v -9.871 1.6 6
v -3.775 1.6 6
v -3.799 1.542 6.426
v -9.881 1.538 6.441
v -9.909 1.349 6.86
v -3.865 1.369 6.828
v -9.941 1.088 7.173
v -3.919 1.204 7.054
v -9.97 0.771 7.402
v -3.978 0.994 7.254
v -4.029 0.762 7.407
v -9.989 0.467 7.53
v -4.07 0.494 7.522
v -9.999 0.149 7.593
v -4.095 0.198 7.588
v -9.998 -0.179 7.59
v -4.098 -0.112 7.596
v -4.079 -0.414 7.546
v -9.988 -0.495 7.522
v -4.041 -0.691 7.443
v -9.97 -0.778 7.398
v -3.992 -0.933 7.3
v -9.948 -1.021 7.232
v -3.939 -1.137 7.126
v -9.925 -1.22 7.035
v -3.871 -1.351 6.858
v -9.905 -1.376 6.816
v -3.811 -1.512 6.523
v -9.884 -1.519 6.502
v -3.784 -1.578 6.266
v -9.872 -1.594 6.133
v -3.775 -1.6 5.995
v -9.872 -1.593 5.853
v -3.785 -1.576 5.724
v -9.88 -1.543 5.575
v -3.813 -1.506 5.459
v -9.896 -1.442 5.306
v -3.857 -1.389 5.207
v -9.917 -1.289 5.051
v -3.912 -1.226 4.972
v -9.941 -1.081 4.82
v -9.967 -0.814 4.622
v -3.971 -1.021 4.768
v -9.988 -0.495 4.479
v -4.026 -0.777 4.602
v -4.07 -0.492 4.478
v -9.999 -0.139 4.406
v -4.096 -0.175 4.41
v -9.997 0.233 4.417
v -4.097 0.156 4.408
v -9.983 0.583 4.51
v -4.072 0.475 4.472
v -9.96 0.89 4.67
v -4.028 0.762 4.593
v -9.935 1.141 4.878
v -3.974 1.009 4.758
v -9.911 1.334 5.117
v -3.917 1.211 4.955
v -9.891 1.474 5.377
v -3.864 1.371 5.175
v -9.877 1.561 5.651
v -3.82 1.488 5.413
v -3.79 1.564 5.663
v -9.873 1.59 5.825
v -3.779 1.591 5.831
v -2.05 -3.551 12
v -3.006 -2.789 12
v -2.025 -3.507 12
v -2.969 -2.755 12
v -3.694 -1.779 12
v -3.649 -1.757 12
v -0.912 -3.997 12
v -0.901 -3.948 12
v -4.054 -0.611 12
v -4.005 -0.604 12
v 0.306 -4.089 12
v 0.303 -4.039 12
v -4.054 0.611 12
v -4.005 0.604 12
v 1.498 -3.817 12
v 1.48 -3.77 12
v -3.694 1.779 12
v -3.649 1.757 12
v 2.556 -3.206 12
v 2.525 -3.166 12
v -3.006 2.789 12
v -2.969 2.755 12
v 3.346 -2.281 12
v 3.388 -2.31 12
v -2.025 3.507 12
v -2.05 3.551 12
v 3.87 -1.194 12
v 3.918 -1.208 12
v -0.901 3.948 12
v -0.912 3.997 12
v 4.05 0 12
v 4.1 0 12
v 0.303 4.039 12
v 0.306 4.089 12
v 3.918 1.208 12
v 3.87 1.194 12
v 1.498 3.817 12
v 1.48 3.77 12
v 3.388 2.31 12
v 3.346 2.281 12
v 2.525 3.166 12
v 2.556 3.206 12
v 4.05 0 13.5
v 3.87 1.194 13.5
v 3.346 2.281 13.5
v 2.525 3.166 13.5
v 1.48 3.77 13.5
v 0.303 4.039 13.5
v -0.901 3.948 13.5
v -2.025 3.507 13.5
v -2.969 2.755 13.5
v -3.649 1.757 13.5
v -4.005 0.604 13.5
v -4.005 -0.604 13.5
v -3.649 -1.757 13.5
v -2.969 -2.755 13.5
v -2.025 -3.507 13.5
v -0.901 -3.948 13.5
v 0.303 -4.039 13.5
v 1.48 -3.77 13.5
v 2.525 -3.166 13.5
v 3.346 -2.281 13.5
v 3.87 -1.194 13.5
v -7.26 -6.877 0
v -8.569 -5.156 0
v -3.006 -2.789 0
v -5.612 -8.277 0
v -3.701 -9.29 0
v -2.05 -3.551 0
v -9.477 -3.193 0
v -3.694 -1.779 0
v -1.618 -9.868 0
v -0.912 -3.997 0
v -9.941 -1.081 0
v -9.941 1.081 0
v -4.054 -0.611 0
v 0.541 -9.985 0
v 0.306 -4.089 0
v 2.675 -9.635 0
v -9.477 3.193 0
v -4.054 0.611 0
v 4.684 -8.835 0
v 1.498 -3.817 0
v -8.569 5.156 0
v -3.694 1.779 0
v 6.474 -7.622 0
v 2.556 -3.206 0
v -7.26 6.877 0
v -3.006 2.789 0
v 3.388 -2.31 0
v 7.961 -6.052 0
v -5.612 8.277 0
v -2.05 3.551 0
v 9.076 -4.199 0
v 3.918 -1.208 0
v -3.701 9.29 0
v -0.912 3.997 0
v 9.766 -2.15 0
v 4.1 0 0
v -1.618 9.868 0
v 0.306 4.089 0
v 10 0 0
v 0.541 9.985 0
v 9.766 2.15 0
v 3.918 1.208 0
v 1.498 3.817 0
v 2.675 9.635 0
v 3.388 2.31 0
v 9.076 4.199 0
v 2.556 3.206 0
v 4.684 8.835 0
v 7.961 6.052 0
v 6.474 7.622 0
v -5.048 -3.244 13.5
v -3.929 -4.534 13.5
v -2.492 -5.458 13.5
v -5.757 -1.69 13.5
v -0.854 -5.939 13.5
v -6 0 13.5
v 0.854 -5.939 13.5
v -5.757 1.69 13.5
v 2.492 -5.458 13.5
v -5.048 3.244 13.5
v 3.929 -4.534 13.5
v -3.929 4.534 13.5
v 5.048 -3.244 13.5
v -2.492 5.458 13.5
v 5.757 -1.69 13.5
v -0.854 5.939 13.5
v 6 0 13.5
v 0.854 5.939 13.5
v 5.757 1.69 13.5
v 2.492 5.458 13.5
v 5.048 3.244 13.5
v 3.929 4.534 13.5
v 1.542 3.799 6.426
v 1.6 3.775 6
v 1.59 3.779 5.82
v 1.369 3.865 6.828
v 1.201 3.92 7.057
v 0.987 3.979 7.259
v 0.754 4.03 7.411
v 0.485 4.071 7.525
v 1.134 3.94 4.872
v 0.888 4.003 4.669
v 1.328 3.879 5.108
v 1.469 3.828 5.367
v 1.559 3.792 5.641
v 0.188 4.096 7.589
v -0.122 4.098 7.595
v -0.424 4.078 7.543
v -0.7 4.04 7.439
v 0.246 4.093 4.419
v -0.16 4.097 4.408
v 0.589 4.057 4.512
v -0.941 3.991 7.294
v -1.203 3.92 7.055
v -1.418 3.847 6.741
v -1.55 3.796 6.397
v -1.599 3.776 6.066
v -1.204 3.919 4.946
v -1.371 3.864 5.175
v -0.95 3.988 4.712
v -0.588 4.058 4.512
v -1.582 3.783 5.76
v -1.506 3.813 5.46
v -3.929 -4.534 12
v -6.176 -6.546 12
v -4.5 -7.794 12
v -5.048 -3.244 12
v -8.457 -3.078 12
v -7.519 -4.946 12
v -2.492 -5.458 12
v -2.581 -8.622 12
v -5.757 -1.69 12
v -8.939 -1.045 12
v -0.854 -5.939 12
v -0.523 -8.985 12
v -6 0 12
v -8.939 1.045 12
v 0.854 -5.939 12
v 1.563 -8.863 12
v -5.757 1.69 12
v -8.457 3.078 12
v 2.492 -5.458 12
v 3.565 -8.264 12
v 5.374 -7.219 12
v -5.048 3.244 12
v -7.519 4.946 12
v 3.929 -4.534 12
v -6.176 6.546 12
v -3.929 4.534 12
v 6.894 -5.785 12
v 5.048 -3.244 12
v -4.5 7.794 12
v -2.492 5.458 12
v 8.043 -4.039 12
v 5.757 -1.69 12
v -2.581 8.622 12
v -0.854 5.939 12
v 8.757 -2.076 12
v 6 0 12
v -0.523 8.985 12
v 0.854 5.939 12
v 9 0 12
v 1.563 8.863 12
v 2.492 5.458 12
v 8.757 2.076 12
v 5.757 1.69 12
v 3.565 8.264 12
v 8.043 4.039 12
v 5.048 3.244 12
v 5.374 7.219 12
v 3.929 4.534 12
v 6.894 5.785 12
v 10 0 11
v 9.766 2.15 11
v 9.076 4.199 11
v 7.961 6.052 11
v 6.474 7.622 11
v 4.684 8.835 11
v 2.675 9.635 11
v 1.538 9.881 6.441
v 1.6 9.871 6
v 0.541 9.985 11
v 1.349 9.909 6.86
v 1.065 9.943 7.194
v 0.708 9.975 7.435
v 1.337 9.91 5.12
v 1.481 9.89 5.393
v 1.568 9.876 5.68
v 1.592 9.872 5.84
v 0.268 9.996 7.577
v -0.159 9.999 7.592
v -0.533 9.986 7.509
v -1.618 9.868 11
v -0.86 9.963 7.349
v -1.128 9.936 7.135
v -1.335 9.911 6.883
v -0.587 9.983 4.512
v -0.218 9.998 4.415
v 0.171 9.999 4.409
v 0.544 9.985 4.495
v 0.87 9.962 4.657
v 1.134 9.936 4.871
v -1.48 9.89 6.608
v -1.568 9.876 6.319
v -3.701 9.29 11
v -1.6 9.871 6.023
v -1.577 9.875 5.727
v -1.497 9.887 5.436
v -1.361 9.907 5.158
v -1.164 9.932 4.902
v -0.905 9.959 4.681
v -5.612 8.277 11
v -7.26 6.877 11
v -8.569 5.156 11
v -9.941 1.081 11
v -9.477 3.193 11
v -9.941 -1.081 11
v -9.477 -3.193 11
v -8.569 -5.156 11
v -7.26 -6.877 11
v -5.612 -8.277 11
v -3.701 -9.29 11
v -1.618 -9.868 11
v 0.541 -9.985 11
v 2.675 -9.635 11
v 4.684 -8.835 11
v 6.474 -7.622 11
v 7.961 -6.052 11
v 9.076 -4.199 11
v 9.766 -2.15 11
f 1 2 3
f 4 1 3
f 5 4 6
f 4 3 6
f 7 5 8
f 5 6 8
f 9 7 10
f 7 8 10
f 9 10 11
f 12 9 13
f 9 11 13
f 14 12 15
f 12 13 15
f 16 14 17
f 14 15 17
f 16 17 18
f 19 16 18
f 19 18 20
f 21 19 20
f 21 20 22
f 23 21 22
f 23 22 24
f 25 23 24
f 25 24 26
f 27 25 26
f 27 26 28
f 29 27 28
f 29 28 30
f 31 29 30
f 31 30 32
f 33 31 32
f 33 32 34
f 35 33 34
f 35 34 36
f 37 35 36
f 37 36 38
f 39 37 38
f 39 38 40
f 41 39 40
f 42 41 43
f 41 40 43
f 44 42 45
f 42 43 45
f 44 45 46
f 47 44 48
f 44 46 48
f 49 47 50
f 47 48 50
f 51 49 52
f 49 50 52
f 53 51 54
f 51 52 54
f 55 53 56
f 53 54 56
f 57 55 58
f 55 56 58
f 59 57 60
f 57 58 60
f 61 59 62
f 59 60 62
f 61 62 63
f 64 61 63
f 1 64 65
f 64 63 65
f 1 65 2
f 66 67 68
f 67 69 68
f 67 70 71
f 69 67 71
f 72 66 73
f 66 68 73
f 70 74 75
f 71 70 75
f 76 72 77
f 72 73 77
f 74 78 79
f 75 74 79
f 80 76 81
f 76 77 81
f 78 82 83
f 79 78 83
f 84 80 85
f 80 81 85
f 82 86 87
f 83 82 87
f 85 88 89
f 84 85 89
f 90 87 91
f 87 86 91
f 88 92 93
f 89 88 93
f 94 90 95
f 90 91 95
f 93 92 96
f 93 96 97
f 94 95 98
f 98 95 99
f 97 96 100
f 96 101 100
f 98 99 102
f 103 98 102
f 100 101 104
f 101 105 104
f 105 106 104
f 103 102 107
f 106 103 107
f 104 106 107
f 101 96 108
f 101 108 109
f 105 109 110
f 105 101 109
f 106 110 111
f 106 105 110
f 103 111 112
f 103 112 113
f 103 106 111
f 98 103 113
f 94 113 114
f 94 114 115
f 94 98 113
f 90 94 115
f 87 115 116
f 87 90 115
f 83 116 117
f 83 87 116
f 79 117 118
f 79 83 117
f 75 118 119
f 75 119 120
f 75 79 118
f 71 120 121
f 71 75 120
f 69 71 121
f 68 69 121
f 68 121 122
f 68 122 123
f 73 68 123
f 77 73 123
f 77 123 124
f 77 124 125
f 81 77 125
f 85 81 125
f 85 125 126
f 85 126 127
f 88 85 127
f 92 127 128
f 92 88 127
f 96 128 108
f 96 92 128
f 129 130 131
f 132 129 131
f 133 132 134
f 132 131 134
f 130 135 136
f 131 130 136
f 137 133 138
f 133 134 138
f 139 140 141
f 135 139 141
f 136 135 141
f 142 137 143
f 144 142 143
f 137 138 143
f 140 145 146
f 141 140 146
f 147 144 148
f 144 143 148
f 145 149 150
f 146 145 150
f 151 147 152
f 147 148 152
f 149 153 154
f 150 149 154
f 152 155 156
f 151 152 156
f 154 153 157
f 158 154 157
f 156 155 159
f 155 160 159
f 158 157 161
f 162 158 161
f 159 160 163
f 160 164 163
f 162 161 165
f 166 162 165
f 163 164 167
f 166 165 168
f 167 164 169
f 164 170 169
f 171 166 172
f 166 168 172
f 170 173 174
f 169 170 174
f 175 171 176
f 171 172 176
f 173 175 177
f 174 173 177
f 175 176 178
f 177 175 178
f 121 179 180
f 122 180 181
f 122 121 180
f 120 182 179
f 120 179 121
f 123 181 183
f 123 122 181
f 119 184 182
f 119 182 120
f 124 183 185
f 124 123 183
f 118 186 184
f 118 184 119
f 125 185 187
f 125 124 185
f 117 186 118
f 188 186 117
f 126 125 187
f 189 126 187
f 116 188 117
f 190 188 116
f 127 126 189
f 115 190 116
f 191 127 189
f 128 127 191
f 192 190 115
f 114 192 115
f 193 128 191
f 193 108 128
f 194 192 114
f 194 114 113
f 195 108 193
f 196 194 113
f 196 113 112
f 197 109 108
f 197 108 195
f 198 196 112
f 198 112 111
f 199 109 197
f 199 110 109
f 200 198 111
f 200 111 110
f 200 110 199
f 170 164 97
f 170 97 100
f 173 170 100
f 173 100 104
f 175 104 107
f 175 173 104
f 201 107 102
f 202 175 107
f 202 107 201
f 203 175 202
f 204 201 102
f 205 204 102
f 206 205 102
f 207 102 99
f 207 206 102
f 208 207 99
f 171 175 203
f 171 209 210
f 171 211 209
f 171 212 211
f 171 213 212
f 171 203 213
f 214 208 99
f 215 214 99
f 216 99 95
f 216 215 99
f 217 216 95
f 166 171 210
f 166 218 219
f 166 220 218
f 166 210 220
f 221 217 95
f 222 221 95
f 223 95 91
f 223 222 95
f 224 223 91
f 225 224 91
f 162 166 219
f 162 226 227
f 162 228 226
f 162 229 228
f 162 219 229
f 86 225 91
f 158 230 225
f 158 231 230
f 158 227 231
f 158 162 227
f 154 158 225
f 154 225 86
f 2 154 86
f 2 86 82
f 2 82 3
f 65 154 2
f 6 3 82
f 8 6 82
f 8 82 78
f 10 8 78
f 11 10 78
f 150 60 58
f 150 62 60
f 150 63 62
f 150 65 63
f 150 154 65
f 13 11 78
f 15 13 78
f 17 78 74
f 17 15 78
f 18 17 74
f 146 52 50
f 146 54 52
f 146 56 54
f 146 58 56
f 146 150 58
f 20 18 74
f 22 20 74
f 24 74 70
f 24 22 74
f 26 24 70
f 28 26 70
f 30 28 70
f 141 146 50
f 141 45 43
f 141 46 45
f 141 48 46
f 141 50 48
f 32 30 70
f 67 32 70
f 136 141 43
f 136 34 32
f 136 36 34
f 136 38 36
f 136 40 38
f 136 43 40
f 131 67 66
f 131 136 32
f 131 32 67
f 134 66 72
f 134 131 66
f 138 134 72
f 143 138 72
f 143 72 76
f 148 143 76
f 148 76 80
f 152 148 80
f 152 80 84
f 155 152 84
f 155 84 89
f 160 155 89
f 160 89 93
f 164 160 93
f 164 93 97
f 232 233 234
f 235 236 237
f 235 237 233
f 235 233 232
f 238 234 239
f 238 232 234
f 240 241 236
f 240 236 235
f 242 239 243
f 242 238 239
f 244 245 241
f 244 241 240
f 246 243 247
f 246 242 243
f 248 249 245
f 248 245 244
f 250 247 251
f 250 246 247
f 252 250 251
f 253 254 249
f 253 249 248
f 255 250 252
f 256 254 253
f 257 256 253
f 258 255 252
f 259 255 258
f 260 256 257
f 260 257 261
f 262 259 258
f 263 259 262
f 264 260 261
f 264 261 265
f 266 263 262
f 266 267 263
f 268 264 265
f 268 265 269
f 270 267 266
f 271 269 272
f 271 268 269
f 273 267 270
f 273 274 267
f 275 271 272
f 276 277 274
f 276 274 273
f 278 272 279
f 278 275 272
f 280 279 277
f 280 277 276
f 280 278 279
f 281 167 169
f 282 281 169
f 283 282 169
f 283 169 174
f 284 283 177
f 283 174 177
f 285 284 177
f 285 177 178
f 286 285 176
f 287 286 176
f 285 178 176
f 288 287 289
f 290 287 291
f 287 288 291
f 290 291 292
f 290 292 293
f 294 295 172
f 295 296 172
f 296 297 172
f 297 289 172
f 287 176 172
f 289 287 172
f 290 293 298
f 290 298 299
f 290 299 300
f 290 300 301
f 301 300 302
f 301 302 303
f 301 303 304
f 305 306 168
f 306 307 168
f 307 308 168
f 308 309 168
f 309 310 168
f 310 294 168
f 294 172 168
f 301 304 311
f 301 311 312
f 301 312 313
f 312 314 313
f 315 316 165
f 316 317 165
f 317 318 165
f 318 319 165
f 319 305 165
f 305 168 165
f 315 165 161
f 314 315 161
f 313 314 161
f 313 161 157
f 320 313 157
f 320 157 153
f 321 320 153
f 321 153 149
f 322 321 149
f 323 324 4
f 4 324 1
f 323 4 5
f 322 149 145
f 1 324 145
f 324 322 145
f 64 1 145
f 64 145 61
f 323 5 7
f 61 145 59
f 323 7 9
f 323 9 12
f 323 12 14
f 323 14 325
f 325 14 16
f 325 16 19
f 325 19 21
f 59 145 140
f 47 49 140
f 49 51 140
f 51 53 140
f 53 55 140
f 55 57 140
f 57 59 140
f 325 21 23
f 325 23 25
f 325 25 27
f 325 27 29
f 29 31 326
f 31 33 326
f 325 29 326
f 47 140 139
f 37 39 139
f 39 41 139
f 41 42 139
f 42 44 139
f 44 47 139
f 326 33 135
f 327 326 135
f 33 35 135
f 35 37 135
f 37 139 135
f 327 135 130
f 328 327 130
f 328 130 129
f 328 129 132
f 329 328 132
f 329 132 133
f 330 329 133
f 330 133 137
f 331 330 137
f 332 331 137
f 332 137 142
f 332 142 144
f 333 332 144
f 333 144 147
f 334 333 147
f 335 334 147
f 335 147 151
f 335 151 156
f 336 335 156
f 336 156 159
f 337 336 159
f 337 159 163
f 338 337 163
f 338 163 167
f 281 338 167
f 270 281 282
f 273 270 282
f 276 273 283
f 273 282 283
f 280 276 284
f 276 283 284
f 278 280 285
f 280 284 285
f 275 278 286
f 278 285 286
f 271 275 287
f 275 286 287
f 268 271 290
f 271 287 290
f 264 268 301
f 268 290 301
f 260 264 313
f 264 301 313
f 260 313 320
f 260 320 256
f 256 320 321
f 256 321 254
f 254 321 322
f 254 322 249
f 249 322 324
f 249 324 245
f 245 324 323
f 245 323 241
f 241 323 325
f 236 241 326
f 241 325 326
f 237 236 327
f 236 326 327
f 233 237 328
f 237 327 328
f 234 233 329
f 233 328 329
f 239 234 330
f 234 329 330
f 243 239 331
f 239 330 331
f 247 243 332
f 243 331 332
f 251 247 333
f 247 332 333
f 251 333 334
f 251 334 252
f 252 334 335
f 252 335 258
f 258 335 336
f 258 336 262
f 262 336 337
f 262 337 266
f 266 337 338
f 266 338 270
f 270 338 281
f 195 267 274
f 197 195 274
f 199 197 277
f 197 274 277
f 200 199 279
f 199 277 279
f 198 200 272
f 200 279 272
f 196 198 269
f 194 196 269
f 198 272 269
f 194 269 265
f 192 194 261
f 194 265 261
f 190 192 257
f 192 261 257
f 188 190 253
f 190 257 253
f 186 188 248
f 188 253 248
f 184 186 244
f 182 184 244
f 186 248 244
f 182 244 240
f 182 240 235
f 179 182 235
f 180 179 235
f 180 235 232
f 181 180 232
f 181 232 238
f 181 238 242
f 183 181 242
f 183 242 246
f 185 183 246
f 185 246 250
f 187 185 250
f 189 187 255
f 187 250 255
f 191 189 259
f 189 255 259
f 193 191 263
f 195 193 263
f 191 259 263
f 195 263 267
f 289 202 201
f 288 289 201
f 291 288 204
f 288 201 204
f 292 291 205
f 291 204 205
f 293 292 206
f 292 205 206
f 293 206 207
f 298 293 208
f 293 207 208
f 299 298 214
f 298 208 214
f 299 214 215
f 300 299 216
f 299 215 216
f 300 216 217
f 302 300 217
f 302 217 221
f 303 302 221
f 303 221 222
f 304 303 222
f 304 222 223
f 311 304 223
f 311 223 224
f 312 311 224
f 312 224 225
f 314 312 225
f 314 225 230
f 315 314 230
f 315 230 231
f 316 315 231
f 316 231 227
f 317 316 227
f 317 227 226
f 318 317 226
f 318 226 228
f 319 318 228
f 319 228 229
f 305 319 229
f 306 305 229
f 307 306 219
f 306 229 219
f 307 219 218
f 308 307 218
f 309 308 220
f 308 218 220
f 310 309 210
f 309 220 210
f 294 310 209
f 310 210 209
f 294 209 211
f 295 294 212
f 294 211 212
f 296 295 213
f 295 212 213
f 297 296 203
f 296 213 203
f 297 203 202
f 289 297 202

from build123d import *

# Parameters (mm, degrees)
F0_R     = 10
F0_R_2   = 4.1
F1_DEPTH = 12
F2_R     = 1.6
F3_DEPTH = 25
F4_R     = 1.6
F5_DEPTH = 25
F6_R     = 6
F6_R_2   = 4.05
F7_DEPTH = 1.5
F8_SIZE  = 1


with BuildPart() as f1:
    # F0 (on Top) → F1 (new body)
    with BuildSketch(Plane.XY):
        Circle(F0_R)
        Circle(F0_R_2, mode=Mode.SUBTRACT)
    extrude(amount=F1_DEPTH)

    # F2 (on Front) → F3 (cut)
    with BuildSketch(Plane.XZ):
        with Locations((0, 6)):
            Circle(F2_R)
    extrude(amount=-F3_DEPTH, mode=Mode.SUBTRACT)

    # F4 (on Right) → F5 (cut)
    with BuildSketch(Plane.YZ):
        with Locations((0, 6)):
            Circle(F4_R)
    extrude(amount=-F5_DEPTH, mode=Mode.SUBTRACT)

    # F6 (on face) → F7 (join)
    with BuildSketch(Plane.XY.offset(12)):
        Circle(F6_R)
        Circle(F6_R_2, mode=Mode.SUBTRACT)
    extrude(amount=F7_DEPTH)

    # F8
    f8_edges = [f1.edges().sort_by_distance(p)[0] for p in [
        (-10, 0, 12),
    ]]
    chamfer(f8_edges, length=F8_SIZE)


solid = f1.part
